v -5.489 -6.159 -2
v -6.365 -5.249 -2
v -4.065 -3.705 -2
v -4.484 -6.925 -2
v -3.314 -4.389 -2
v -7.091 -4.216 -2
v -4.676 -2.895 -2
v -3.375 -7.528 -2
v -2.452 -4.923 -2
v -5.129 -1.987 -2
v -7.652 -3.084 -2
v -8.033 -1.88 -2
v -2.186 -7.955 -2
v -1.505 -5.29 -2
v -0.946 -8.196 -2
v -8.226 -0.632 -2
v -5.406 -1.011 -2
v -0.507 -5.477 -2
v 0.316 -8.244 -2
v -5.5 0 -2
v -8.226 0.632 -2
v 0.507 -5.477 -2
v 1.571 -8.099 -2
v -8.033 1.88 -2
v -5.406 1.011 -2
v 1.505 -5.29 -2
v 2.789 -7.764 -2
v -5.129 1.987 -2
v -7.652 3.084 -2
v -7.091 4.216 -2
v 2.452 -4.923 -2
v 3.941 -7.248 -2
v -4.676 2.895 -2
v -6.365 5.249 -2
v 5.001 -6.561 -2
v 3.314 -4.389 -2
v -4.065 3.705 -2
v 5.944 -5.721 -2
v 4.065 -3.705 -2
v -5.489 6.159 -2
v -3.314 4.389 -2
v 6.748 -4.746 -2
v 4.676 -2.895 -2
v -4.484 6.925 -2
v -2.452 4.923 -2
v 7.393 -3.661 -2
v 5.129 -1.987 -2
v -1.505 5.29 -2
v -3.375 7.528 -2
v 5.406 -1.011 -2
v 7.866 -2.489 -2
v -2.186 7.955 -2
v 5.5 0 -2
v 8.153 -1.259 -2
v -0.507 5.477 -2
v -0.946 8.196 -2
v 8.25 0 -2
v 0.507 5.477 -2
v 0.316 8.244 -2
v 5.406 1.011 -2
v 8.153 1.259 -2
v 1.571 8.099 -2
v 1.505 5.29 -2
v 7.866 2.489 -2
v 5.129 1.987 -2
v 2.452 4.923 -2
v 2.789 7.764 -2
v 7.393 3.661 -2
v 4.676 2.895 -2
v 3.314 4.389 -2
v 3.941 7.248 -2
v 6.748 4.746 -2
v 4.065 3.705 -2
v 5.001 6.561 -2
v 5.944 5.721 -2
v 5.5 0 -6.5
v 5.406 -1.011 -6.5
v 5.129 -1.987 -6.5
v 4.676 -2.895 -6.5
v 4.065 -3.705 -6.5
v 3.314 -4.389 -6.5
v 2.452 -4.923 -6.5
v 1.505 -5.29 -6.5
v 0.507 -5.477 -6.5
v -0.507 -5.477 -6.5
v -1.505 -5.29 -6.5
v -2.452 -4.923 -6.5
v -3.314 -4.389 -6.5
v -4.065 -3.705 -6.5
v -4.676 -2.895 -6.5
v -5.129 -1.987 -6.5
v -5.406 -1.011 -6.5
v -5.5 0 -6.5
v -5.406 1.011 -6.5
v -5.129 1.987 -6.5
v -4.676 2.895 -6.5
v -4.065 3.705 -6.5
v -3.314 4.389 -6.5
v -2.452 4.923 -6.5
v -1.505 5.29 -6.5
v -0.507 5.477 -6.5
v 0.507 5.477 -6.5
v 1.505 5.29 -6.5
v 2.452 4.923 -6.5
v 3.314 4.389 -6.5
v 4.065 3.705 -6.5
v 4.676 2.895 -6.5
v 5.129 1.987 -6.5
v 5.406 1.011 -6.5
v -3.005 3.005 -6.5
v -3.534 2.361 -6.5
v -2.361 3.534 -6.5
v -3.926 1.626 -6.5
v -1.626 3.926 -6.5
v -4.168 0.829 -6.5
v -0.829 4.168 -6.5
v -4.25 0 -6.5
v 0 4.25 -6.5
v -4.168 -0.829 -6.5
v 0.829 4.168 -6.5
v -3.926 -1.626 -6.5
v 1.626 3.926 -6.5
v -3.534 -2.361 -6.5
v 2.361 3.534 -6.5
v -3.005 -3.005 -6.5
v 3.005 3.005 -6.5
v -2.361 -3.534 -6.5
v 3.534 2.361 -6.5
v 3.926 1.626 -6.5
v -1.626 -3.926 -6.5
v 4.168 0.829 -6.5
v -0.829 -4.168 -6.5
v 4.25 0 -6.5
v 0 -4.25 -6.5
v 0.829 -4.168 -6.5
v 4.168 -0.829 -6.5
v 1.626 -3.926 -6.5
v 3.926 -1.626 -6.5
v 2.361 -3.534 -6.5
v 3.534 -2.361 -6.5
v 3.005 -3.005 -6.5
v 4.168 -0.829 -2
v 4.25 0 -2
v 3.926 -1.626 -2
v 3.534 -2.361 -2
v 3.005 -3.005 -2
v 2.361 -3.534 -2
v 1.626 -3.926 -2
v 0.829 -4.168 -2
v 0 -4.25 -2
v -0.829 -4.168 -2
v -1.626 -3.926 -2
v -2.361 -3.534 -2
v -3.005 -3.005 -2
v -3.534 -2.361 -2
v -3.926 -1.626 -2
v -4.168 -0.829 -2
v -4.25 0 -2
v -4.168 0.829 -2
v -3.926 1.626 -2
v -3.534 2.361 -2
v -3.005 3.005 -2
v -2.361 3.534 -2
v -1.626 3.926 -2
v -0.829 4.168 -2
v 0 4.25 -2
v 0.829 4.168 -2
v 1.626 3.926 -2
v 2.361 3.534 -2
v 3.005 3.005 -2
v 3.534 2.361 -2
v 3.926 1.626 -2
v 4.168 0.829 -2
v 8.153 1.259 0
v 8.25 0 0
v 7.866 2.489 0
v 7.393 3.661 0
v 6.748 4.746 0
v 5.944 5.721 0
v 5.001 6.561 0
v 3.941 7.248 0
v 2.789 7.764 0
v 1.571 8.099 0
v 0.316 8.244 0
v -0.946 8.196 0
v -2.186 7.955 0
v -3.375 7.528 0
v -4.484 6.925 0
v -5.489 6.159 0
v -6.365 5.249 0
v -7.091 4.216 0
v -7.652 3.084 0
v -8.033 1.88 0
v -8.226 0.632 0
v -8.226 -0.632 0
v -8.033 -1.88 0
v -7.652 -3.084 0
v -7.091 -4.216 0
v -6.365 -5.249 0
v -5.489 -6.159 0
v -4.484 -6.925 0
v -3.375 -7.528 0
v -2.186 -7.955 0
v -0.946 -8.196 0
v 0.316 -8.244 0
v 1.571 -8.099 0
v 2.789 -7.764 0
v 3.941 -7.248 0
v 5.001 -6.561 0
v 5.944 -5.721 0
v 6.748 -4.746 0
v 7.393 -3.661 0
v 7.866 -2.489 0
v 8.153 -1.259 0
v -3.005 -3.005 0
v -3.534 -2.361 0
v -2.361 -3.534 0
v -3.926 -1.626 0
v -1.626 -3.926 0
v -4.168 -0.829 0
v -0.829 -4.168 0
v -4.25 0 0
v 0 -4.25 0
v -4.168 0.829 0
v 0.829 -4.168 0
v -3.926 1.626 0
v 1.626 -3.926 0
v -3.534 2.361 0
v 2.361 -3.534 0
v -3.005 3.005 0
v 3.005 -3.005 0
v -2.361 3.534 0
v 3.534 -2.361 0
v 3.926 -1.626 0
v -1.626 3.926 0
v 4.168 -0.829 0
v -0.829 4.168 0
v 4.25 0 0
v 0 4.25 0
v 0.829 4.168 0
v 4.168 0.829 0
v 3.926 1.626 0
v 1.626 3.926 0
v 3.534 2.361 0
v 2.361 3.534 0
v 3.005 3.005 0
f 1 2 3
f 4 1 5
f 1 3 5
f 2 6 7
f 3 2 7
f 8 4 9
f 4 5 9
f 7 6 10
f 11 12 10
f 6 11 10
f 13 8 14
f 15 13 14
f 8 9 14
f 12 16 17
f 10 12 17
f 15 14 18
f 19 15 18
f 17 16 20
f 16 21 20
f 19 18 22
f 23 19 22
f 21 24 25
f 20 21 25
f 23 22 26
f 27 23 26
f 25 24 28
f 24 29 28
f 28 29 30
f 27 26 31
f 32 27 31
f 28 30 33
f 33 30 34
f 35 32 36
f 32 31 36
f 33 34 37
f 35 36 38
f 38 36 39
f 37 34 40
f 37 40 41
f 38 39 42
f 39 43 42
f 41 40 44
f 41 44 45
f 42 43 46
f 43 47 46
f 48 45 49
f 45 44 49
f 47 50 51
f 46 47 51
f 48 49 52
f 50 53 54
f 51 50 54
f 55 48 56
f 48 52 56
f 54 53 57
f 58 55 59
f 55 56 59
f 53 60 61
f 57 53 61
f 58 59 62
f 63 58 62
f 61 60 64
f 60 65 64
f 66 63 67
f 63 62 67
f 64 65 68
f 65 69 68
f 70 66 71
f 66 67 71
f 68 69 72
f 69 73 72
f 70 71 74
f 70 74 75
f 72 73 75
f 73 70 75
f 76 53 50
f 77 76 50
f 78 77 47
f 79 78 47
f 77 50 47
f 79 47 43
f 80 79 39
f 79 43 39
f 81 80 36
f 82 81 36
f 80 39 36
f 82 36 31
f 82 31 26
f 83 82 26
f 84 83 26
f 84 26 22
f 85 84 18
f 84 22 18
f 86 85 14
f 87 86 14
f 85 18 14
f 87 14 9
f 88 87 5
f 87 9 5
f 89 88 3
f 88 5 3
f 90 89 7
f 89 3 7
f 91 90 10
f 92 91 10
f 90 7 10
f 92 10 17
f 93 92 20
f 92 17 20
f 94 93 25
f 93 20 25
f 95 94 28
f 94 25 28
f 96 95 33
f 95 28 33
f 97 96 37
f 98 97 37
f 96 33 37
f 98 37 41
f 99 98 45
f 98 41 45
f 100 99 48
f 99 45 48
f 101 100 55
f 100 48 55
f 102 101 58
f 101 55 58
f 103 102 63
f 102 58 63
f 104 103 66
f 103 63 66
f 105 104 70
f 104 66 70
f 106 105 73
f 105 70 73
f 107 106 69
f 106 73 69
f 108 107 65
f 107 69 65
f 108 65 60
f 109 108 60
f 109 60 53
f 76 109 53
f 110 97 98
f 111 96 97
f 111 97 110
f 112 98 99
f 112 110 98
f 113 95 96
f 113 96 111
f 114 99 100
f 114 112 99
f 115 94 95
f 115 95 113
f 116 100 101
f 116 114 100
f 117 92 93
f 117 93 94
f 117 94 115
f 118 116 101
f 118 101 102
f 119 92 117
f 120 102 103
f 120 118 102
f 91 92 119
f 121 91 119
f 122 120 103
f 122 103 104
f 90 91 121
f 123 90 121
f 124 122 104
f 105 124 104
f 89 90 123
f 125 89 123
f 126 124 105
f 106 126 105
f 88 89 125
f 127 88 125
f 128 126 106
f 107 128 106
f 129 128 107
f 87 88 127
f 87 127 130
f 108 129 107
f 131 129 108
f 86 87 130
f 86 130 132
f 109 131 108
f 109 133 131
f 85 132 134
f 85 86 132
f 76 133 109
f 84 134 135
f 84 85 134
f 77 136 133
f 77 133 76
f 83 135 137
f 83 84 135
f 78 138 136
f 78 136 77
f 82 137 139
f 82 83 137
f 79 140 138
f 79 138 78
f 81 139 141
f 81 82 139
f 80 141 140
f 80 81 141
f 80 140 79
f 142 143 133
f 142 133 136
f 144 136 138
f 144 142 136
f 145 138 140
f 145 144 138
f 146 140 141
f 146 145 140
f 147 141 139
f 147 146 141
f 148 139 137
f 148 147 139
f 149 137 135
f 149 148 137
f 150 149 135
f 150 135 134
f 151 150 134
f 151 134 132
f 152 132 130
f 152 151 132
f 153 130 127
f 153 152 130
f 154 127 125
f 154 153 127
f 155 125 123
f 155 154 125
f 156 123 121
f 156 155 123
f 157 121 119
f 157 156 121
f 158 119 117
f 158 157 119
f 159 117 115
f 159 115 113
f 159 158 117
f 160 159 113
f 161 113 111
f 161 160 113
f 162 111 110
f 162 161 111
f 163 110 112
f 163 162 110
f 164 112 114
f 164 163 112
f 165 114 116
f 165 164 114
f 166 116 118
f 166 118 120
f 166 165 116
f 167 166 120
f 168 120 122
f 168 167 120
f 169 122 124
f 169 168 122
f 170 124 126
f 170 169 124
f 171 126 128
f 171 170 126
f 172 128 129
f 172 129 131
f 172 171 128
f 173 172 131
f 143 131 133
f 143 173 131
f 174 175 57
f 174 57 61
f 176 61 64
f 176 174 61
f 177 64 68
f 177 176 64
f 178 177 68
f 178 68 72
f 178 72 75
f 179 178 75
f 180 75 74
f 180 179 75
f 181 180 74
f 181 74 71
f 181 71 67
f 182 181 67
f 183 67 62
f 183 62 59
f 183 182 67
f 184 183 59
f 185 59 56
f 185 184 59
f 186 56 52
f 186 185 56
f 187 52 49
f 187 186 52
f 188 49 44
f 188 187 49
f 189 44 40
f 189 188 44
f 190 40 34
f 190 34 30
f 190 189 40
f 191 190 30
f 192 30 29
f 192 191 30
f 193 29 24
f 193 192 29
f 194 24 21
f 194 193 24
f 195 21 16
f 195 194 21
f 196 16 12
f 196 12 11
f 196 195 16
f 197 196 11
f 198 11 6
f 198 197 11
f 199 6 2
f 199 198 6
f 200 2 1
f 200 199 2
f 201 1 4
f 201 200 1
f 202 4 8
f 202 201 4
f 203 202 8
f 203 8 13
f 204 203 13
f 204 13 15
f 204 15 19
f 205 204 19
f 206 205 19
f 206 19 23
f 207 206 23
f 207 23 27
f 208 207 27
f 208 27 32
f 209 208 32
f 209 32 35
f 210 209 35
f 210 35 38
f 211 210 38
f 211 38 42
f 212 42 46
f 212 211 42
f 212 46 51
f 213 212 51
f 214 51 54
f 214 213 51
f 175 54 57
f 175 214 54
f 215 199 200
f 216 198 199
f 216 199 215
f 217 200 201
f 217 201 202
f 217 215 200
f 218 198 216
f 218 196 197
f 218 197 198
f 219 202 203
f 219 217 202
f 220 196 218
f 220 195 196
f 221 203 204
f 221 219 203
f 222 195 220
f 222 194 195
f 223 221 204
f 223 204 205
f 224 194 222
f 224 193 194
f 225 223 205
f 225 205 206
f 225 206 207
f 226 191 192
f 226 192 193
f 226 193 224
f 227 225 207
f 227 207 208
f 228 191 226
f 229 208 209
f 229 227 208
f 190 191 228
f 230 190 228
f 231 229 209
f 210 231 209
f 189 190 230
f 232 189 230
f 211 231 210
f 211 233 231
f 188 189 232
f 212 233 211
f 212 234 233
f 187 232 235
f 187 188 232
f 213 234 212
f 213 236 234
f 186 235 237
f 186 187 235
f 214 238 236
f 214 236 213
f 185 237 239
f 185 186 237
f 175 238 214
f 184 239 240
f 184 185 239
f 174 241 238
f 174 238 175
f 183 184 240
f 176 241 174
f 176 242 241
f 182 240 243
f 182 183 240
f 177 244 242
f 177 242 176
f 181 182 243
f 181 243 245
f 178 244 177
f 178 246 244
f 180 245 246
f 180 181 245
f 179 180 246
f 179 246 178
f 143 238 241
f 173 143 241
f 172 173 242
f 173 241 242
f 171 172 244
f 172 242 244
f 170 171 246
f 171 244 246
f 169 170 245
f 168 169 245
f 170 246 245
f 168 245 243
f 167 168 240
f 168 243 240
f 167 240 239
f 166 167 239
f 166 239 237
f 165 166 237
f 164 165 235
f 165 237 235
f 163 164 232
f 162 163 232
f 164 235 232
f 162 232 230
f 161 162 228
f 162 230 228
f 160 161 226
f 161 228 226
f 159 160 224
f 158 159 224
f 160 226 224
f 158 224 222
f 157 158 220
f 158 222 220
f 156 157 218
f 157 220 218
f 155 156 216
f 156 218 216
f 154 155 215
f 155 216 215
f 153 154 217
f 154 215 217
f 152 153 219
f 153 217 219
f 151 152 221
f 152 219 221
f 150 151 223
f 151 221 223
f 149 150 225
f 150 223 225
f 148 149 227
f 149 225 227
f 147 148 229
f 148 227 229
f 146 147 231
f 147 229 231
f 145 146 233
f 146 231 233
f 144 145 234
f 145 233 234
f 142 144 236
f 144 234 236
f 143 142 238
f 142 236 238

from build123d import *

# Parameters (mm, degrees)
CROQUIS1_R              = 8.25
CROQUIS1_R_2            = 4.25
SALIENTE_EXTRUIR1_DEPTH = 2
CROQUIS2_R              = 5.5
CROQUIS2_R_2            = 4.25
SALIENTE_EXTRUIR2_DEPTH = 4.5


with BuildPart() as part:
    # Croquis1 → Saliente-Extruir1 (new body)
    with BuildSketch(Plane.XY):
        Circle(CROQUIS1_R)
        Circle(CROQUIS1_R_2, mode=Mode.SUBTRACT)
    extrude(amount=-SALIENTE_EXTRUIR1_DEPTH)

    # Croquis2 → Saliente-Extruir2 (add)
    with BuildSketch(Plane(origin=(0, 0, -2), x_dir=(-1, 0, 0), z_dir=(0, 0, -1))):
        with Locations(Location((0, 0, 0), (0, 0, 180))):
            Circle(CROQUIS2_R)
        with Locations(Location((0, 0, 0), (0, 0, 180))):
            Circle(CROQUIS2_R_2, mode=Mode.SUBTRACT)
    extrude(amount=SALIENTE_EXTRUIR2_DEPTH)


solid = part.part
